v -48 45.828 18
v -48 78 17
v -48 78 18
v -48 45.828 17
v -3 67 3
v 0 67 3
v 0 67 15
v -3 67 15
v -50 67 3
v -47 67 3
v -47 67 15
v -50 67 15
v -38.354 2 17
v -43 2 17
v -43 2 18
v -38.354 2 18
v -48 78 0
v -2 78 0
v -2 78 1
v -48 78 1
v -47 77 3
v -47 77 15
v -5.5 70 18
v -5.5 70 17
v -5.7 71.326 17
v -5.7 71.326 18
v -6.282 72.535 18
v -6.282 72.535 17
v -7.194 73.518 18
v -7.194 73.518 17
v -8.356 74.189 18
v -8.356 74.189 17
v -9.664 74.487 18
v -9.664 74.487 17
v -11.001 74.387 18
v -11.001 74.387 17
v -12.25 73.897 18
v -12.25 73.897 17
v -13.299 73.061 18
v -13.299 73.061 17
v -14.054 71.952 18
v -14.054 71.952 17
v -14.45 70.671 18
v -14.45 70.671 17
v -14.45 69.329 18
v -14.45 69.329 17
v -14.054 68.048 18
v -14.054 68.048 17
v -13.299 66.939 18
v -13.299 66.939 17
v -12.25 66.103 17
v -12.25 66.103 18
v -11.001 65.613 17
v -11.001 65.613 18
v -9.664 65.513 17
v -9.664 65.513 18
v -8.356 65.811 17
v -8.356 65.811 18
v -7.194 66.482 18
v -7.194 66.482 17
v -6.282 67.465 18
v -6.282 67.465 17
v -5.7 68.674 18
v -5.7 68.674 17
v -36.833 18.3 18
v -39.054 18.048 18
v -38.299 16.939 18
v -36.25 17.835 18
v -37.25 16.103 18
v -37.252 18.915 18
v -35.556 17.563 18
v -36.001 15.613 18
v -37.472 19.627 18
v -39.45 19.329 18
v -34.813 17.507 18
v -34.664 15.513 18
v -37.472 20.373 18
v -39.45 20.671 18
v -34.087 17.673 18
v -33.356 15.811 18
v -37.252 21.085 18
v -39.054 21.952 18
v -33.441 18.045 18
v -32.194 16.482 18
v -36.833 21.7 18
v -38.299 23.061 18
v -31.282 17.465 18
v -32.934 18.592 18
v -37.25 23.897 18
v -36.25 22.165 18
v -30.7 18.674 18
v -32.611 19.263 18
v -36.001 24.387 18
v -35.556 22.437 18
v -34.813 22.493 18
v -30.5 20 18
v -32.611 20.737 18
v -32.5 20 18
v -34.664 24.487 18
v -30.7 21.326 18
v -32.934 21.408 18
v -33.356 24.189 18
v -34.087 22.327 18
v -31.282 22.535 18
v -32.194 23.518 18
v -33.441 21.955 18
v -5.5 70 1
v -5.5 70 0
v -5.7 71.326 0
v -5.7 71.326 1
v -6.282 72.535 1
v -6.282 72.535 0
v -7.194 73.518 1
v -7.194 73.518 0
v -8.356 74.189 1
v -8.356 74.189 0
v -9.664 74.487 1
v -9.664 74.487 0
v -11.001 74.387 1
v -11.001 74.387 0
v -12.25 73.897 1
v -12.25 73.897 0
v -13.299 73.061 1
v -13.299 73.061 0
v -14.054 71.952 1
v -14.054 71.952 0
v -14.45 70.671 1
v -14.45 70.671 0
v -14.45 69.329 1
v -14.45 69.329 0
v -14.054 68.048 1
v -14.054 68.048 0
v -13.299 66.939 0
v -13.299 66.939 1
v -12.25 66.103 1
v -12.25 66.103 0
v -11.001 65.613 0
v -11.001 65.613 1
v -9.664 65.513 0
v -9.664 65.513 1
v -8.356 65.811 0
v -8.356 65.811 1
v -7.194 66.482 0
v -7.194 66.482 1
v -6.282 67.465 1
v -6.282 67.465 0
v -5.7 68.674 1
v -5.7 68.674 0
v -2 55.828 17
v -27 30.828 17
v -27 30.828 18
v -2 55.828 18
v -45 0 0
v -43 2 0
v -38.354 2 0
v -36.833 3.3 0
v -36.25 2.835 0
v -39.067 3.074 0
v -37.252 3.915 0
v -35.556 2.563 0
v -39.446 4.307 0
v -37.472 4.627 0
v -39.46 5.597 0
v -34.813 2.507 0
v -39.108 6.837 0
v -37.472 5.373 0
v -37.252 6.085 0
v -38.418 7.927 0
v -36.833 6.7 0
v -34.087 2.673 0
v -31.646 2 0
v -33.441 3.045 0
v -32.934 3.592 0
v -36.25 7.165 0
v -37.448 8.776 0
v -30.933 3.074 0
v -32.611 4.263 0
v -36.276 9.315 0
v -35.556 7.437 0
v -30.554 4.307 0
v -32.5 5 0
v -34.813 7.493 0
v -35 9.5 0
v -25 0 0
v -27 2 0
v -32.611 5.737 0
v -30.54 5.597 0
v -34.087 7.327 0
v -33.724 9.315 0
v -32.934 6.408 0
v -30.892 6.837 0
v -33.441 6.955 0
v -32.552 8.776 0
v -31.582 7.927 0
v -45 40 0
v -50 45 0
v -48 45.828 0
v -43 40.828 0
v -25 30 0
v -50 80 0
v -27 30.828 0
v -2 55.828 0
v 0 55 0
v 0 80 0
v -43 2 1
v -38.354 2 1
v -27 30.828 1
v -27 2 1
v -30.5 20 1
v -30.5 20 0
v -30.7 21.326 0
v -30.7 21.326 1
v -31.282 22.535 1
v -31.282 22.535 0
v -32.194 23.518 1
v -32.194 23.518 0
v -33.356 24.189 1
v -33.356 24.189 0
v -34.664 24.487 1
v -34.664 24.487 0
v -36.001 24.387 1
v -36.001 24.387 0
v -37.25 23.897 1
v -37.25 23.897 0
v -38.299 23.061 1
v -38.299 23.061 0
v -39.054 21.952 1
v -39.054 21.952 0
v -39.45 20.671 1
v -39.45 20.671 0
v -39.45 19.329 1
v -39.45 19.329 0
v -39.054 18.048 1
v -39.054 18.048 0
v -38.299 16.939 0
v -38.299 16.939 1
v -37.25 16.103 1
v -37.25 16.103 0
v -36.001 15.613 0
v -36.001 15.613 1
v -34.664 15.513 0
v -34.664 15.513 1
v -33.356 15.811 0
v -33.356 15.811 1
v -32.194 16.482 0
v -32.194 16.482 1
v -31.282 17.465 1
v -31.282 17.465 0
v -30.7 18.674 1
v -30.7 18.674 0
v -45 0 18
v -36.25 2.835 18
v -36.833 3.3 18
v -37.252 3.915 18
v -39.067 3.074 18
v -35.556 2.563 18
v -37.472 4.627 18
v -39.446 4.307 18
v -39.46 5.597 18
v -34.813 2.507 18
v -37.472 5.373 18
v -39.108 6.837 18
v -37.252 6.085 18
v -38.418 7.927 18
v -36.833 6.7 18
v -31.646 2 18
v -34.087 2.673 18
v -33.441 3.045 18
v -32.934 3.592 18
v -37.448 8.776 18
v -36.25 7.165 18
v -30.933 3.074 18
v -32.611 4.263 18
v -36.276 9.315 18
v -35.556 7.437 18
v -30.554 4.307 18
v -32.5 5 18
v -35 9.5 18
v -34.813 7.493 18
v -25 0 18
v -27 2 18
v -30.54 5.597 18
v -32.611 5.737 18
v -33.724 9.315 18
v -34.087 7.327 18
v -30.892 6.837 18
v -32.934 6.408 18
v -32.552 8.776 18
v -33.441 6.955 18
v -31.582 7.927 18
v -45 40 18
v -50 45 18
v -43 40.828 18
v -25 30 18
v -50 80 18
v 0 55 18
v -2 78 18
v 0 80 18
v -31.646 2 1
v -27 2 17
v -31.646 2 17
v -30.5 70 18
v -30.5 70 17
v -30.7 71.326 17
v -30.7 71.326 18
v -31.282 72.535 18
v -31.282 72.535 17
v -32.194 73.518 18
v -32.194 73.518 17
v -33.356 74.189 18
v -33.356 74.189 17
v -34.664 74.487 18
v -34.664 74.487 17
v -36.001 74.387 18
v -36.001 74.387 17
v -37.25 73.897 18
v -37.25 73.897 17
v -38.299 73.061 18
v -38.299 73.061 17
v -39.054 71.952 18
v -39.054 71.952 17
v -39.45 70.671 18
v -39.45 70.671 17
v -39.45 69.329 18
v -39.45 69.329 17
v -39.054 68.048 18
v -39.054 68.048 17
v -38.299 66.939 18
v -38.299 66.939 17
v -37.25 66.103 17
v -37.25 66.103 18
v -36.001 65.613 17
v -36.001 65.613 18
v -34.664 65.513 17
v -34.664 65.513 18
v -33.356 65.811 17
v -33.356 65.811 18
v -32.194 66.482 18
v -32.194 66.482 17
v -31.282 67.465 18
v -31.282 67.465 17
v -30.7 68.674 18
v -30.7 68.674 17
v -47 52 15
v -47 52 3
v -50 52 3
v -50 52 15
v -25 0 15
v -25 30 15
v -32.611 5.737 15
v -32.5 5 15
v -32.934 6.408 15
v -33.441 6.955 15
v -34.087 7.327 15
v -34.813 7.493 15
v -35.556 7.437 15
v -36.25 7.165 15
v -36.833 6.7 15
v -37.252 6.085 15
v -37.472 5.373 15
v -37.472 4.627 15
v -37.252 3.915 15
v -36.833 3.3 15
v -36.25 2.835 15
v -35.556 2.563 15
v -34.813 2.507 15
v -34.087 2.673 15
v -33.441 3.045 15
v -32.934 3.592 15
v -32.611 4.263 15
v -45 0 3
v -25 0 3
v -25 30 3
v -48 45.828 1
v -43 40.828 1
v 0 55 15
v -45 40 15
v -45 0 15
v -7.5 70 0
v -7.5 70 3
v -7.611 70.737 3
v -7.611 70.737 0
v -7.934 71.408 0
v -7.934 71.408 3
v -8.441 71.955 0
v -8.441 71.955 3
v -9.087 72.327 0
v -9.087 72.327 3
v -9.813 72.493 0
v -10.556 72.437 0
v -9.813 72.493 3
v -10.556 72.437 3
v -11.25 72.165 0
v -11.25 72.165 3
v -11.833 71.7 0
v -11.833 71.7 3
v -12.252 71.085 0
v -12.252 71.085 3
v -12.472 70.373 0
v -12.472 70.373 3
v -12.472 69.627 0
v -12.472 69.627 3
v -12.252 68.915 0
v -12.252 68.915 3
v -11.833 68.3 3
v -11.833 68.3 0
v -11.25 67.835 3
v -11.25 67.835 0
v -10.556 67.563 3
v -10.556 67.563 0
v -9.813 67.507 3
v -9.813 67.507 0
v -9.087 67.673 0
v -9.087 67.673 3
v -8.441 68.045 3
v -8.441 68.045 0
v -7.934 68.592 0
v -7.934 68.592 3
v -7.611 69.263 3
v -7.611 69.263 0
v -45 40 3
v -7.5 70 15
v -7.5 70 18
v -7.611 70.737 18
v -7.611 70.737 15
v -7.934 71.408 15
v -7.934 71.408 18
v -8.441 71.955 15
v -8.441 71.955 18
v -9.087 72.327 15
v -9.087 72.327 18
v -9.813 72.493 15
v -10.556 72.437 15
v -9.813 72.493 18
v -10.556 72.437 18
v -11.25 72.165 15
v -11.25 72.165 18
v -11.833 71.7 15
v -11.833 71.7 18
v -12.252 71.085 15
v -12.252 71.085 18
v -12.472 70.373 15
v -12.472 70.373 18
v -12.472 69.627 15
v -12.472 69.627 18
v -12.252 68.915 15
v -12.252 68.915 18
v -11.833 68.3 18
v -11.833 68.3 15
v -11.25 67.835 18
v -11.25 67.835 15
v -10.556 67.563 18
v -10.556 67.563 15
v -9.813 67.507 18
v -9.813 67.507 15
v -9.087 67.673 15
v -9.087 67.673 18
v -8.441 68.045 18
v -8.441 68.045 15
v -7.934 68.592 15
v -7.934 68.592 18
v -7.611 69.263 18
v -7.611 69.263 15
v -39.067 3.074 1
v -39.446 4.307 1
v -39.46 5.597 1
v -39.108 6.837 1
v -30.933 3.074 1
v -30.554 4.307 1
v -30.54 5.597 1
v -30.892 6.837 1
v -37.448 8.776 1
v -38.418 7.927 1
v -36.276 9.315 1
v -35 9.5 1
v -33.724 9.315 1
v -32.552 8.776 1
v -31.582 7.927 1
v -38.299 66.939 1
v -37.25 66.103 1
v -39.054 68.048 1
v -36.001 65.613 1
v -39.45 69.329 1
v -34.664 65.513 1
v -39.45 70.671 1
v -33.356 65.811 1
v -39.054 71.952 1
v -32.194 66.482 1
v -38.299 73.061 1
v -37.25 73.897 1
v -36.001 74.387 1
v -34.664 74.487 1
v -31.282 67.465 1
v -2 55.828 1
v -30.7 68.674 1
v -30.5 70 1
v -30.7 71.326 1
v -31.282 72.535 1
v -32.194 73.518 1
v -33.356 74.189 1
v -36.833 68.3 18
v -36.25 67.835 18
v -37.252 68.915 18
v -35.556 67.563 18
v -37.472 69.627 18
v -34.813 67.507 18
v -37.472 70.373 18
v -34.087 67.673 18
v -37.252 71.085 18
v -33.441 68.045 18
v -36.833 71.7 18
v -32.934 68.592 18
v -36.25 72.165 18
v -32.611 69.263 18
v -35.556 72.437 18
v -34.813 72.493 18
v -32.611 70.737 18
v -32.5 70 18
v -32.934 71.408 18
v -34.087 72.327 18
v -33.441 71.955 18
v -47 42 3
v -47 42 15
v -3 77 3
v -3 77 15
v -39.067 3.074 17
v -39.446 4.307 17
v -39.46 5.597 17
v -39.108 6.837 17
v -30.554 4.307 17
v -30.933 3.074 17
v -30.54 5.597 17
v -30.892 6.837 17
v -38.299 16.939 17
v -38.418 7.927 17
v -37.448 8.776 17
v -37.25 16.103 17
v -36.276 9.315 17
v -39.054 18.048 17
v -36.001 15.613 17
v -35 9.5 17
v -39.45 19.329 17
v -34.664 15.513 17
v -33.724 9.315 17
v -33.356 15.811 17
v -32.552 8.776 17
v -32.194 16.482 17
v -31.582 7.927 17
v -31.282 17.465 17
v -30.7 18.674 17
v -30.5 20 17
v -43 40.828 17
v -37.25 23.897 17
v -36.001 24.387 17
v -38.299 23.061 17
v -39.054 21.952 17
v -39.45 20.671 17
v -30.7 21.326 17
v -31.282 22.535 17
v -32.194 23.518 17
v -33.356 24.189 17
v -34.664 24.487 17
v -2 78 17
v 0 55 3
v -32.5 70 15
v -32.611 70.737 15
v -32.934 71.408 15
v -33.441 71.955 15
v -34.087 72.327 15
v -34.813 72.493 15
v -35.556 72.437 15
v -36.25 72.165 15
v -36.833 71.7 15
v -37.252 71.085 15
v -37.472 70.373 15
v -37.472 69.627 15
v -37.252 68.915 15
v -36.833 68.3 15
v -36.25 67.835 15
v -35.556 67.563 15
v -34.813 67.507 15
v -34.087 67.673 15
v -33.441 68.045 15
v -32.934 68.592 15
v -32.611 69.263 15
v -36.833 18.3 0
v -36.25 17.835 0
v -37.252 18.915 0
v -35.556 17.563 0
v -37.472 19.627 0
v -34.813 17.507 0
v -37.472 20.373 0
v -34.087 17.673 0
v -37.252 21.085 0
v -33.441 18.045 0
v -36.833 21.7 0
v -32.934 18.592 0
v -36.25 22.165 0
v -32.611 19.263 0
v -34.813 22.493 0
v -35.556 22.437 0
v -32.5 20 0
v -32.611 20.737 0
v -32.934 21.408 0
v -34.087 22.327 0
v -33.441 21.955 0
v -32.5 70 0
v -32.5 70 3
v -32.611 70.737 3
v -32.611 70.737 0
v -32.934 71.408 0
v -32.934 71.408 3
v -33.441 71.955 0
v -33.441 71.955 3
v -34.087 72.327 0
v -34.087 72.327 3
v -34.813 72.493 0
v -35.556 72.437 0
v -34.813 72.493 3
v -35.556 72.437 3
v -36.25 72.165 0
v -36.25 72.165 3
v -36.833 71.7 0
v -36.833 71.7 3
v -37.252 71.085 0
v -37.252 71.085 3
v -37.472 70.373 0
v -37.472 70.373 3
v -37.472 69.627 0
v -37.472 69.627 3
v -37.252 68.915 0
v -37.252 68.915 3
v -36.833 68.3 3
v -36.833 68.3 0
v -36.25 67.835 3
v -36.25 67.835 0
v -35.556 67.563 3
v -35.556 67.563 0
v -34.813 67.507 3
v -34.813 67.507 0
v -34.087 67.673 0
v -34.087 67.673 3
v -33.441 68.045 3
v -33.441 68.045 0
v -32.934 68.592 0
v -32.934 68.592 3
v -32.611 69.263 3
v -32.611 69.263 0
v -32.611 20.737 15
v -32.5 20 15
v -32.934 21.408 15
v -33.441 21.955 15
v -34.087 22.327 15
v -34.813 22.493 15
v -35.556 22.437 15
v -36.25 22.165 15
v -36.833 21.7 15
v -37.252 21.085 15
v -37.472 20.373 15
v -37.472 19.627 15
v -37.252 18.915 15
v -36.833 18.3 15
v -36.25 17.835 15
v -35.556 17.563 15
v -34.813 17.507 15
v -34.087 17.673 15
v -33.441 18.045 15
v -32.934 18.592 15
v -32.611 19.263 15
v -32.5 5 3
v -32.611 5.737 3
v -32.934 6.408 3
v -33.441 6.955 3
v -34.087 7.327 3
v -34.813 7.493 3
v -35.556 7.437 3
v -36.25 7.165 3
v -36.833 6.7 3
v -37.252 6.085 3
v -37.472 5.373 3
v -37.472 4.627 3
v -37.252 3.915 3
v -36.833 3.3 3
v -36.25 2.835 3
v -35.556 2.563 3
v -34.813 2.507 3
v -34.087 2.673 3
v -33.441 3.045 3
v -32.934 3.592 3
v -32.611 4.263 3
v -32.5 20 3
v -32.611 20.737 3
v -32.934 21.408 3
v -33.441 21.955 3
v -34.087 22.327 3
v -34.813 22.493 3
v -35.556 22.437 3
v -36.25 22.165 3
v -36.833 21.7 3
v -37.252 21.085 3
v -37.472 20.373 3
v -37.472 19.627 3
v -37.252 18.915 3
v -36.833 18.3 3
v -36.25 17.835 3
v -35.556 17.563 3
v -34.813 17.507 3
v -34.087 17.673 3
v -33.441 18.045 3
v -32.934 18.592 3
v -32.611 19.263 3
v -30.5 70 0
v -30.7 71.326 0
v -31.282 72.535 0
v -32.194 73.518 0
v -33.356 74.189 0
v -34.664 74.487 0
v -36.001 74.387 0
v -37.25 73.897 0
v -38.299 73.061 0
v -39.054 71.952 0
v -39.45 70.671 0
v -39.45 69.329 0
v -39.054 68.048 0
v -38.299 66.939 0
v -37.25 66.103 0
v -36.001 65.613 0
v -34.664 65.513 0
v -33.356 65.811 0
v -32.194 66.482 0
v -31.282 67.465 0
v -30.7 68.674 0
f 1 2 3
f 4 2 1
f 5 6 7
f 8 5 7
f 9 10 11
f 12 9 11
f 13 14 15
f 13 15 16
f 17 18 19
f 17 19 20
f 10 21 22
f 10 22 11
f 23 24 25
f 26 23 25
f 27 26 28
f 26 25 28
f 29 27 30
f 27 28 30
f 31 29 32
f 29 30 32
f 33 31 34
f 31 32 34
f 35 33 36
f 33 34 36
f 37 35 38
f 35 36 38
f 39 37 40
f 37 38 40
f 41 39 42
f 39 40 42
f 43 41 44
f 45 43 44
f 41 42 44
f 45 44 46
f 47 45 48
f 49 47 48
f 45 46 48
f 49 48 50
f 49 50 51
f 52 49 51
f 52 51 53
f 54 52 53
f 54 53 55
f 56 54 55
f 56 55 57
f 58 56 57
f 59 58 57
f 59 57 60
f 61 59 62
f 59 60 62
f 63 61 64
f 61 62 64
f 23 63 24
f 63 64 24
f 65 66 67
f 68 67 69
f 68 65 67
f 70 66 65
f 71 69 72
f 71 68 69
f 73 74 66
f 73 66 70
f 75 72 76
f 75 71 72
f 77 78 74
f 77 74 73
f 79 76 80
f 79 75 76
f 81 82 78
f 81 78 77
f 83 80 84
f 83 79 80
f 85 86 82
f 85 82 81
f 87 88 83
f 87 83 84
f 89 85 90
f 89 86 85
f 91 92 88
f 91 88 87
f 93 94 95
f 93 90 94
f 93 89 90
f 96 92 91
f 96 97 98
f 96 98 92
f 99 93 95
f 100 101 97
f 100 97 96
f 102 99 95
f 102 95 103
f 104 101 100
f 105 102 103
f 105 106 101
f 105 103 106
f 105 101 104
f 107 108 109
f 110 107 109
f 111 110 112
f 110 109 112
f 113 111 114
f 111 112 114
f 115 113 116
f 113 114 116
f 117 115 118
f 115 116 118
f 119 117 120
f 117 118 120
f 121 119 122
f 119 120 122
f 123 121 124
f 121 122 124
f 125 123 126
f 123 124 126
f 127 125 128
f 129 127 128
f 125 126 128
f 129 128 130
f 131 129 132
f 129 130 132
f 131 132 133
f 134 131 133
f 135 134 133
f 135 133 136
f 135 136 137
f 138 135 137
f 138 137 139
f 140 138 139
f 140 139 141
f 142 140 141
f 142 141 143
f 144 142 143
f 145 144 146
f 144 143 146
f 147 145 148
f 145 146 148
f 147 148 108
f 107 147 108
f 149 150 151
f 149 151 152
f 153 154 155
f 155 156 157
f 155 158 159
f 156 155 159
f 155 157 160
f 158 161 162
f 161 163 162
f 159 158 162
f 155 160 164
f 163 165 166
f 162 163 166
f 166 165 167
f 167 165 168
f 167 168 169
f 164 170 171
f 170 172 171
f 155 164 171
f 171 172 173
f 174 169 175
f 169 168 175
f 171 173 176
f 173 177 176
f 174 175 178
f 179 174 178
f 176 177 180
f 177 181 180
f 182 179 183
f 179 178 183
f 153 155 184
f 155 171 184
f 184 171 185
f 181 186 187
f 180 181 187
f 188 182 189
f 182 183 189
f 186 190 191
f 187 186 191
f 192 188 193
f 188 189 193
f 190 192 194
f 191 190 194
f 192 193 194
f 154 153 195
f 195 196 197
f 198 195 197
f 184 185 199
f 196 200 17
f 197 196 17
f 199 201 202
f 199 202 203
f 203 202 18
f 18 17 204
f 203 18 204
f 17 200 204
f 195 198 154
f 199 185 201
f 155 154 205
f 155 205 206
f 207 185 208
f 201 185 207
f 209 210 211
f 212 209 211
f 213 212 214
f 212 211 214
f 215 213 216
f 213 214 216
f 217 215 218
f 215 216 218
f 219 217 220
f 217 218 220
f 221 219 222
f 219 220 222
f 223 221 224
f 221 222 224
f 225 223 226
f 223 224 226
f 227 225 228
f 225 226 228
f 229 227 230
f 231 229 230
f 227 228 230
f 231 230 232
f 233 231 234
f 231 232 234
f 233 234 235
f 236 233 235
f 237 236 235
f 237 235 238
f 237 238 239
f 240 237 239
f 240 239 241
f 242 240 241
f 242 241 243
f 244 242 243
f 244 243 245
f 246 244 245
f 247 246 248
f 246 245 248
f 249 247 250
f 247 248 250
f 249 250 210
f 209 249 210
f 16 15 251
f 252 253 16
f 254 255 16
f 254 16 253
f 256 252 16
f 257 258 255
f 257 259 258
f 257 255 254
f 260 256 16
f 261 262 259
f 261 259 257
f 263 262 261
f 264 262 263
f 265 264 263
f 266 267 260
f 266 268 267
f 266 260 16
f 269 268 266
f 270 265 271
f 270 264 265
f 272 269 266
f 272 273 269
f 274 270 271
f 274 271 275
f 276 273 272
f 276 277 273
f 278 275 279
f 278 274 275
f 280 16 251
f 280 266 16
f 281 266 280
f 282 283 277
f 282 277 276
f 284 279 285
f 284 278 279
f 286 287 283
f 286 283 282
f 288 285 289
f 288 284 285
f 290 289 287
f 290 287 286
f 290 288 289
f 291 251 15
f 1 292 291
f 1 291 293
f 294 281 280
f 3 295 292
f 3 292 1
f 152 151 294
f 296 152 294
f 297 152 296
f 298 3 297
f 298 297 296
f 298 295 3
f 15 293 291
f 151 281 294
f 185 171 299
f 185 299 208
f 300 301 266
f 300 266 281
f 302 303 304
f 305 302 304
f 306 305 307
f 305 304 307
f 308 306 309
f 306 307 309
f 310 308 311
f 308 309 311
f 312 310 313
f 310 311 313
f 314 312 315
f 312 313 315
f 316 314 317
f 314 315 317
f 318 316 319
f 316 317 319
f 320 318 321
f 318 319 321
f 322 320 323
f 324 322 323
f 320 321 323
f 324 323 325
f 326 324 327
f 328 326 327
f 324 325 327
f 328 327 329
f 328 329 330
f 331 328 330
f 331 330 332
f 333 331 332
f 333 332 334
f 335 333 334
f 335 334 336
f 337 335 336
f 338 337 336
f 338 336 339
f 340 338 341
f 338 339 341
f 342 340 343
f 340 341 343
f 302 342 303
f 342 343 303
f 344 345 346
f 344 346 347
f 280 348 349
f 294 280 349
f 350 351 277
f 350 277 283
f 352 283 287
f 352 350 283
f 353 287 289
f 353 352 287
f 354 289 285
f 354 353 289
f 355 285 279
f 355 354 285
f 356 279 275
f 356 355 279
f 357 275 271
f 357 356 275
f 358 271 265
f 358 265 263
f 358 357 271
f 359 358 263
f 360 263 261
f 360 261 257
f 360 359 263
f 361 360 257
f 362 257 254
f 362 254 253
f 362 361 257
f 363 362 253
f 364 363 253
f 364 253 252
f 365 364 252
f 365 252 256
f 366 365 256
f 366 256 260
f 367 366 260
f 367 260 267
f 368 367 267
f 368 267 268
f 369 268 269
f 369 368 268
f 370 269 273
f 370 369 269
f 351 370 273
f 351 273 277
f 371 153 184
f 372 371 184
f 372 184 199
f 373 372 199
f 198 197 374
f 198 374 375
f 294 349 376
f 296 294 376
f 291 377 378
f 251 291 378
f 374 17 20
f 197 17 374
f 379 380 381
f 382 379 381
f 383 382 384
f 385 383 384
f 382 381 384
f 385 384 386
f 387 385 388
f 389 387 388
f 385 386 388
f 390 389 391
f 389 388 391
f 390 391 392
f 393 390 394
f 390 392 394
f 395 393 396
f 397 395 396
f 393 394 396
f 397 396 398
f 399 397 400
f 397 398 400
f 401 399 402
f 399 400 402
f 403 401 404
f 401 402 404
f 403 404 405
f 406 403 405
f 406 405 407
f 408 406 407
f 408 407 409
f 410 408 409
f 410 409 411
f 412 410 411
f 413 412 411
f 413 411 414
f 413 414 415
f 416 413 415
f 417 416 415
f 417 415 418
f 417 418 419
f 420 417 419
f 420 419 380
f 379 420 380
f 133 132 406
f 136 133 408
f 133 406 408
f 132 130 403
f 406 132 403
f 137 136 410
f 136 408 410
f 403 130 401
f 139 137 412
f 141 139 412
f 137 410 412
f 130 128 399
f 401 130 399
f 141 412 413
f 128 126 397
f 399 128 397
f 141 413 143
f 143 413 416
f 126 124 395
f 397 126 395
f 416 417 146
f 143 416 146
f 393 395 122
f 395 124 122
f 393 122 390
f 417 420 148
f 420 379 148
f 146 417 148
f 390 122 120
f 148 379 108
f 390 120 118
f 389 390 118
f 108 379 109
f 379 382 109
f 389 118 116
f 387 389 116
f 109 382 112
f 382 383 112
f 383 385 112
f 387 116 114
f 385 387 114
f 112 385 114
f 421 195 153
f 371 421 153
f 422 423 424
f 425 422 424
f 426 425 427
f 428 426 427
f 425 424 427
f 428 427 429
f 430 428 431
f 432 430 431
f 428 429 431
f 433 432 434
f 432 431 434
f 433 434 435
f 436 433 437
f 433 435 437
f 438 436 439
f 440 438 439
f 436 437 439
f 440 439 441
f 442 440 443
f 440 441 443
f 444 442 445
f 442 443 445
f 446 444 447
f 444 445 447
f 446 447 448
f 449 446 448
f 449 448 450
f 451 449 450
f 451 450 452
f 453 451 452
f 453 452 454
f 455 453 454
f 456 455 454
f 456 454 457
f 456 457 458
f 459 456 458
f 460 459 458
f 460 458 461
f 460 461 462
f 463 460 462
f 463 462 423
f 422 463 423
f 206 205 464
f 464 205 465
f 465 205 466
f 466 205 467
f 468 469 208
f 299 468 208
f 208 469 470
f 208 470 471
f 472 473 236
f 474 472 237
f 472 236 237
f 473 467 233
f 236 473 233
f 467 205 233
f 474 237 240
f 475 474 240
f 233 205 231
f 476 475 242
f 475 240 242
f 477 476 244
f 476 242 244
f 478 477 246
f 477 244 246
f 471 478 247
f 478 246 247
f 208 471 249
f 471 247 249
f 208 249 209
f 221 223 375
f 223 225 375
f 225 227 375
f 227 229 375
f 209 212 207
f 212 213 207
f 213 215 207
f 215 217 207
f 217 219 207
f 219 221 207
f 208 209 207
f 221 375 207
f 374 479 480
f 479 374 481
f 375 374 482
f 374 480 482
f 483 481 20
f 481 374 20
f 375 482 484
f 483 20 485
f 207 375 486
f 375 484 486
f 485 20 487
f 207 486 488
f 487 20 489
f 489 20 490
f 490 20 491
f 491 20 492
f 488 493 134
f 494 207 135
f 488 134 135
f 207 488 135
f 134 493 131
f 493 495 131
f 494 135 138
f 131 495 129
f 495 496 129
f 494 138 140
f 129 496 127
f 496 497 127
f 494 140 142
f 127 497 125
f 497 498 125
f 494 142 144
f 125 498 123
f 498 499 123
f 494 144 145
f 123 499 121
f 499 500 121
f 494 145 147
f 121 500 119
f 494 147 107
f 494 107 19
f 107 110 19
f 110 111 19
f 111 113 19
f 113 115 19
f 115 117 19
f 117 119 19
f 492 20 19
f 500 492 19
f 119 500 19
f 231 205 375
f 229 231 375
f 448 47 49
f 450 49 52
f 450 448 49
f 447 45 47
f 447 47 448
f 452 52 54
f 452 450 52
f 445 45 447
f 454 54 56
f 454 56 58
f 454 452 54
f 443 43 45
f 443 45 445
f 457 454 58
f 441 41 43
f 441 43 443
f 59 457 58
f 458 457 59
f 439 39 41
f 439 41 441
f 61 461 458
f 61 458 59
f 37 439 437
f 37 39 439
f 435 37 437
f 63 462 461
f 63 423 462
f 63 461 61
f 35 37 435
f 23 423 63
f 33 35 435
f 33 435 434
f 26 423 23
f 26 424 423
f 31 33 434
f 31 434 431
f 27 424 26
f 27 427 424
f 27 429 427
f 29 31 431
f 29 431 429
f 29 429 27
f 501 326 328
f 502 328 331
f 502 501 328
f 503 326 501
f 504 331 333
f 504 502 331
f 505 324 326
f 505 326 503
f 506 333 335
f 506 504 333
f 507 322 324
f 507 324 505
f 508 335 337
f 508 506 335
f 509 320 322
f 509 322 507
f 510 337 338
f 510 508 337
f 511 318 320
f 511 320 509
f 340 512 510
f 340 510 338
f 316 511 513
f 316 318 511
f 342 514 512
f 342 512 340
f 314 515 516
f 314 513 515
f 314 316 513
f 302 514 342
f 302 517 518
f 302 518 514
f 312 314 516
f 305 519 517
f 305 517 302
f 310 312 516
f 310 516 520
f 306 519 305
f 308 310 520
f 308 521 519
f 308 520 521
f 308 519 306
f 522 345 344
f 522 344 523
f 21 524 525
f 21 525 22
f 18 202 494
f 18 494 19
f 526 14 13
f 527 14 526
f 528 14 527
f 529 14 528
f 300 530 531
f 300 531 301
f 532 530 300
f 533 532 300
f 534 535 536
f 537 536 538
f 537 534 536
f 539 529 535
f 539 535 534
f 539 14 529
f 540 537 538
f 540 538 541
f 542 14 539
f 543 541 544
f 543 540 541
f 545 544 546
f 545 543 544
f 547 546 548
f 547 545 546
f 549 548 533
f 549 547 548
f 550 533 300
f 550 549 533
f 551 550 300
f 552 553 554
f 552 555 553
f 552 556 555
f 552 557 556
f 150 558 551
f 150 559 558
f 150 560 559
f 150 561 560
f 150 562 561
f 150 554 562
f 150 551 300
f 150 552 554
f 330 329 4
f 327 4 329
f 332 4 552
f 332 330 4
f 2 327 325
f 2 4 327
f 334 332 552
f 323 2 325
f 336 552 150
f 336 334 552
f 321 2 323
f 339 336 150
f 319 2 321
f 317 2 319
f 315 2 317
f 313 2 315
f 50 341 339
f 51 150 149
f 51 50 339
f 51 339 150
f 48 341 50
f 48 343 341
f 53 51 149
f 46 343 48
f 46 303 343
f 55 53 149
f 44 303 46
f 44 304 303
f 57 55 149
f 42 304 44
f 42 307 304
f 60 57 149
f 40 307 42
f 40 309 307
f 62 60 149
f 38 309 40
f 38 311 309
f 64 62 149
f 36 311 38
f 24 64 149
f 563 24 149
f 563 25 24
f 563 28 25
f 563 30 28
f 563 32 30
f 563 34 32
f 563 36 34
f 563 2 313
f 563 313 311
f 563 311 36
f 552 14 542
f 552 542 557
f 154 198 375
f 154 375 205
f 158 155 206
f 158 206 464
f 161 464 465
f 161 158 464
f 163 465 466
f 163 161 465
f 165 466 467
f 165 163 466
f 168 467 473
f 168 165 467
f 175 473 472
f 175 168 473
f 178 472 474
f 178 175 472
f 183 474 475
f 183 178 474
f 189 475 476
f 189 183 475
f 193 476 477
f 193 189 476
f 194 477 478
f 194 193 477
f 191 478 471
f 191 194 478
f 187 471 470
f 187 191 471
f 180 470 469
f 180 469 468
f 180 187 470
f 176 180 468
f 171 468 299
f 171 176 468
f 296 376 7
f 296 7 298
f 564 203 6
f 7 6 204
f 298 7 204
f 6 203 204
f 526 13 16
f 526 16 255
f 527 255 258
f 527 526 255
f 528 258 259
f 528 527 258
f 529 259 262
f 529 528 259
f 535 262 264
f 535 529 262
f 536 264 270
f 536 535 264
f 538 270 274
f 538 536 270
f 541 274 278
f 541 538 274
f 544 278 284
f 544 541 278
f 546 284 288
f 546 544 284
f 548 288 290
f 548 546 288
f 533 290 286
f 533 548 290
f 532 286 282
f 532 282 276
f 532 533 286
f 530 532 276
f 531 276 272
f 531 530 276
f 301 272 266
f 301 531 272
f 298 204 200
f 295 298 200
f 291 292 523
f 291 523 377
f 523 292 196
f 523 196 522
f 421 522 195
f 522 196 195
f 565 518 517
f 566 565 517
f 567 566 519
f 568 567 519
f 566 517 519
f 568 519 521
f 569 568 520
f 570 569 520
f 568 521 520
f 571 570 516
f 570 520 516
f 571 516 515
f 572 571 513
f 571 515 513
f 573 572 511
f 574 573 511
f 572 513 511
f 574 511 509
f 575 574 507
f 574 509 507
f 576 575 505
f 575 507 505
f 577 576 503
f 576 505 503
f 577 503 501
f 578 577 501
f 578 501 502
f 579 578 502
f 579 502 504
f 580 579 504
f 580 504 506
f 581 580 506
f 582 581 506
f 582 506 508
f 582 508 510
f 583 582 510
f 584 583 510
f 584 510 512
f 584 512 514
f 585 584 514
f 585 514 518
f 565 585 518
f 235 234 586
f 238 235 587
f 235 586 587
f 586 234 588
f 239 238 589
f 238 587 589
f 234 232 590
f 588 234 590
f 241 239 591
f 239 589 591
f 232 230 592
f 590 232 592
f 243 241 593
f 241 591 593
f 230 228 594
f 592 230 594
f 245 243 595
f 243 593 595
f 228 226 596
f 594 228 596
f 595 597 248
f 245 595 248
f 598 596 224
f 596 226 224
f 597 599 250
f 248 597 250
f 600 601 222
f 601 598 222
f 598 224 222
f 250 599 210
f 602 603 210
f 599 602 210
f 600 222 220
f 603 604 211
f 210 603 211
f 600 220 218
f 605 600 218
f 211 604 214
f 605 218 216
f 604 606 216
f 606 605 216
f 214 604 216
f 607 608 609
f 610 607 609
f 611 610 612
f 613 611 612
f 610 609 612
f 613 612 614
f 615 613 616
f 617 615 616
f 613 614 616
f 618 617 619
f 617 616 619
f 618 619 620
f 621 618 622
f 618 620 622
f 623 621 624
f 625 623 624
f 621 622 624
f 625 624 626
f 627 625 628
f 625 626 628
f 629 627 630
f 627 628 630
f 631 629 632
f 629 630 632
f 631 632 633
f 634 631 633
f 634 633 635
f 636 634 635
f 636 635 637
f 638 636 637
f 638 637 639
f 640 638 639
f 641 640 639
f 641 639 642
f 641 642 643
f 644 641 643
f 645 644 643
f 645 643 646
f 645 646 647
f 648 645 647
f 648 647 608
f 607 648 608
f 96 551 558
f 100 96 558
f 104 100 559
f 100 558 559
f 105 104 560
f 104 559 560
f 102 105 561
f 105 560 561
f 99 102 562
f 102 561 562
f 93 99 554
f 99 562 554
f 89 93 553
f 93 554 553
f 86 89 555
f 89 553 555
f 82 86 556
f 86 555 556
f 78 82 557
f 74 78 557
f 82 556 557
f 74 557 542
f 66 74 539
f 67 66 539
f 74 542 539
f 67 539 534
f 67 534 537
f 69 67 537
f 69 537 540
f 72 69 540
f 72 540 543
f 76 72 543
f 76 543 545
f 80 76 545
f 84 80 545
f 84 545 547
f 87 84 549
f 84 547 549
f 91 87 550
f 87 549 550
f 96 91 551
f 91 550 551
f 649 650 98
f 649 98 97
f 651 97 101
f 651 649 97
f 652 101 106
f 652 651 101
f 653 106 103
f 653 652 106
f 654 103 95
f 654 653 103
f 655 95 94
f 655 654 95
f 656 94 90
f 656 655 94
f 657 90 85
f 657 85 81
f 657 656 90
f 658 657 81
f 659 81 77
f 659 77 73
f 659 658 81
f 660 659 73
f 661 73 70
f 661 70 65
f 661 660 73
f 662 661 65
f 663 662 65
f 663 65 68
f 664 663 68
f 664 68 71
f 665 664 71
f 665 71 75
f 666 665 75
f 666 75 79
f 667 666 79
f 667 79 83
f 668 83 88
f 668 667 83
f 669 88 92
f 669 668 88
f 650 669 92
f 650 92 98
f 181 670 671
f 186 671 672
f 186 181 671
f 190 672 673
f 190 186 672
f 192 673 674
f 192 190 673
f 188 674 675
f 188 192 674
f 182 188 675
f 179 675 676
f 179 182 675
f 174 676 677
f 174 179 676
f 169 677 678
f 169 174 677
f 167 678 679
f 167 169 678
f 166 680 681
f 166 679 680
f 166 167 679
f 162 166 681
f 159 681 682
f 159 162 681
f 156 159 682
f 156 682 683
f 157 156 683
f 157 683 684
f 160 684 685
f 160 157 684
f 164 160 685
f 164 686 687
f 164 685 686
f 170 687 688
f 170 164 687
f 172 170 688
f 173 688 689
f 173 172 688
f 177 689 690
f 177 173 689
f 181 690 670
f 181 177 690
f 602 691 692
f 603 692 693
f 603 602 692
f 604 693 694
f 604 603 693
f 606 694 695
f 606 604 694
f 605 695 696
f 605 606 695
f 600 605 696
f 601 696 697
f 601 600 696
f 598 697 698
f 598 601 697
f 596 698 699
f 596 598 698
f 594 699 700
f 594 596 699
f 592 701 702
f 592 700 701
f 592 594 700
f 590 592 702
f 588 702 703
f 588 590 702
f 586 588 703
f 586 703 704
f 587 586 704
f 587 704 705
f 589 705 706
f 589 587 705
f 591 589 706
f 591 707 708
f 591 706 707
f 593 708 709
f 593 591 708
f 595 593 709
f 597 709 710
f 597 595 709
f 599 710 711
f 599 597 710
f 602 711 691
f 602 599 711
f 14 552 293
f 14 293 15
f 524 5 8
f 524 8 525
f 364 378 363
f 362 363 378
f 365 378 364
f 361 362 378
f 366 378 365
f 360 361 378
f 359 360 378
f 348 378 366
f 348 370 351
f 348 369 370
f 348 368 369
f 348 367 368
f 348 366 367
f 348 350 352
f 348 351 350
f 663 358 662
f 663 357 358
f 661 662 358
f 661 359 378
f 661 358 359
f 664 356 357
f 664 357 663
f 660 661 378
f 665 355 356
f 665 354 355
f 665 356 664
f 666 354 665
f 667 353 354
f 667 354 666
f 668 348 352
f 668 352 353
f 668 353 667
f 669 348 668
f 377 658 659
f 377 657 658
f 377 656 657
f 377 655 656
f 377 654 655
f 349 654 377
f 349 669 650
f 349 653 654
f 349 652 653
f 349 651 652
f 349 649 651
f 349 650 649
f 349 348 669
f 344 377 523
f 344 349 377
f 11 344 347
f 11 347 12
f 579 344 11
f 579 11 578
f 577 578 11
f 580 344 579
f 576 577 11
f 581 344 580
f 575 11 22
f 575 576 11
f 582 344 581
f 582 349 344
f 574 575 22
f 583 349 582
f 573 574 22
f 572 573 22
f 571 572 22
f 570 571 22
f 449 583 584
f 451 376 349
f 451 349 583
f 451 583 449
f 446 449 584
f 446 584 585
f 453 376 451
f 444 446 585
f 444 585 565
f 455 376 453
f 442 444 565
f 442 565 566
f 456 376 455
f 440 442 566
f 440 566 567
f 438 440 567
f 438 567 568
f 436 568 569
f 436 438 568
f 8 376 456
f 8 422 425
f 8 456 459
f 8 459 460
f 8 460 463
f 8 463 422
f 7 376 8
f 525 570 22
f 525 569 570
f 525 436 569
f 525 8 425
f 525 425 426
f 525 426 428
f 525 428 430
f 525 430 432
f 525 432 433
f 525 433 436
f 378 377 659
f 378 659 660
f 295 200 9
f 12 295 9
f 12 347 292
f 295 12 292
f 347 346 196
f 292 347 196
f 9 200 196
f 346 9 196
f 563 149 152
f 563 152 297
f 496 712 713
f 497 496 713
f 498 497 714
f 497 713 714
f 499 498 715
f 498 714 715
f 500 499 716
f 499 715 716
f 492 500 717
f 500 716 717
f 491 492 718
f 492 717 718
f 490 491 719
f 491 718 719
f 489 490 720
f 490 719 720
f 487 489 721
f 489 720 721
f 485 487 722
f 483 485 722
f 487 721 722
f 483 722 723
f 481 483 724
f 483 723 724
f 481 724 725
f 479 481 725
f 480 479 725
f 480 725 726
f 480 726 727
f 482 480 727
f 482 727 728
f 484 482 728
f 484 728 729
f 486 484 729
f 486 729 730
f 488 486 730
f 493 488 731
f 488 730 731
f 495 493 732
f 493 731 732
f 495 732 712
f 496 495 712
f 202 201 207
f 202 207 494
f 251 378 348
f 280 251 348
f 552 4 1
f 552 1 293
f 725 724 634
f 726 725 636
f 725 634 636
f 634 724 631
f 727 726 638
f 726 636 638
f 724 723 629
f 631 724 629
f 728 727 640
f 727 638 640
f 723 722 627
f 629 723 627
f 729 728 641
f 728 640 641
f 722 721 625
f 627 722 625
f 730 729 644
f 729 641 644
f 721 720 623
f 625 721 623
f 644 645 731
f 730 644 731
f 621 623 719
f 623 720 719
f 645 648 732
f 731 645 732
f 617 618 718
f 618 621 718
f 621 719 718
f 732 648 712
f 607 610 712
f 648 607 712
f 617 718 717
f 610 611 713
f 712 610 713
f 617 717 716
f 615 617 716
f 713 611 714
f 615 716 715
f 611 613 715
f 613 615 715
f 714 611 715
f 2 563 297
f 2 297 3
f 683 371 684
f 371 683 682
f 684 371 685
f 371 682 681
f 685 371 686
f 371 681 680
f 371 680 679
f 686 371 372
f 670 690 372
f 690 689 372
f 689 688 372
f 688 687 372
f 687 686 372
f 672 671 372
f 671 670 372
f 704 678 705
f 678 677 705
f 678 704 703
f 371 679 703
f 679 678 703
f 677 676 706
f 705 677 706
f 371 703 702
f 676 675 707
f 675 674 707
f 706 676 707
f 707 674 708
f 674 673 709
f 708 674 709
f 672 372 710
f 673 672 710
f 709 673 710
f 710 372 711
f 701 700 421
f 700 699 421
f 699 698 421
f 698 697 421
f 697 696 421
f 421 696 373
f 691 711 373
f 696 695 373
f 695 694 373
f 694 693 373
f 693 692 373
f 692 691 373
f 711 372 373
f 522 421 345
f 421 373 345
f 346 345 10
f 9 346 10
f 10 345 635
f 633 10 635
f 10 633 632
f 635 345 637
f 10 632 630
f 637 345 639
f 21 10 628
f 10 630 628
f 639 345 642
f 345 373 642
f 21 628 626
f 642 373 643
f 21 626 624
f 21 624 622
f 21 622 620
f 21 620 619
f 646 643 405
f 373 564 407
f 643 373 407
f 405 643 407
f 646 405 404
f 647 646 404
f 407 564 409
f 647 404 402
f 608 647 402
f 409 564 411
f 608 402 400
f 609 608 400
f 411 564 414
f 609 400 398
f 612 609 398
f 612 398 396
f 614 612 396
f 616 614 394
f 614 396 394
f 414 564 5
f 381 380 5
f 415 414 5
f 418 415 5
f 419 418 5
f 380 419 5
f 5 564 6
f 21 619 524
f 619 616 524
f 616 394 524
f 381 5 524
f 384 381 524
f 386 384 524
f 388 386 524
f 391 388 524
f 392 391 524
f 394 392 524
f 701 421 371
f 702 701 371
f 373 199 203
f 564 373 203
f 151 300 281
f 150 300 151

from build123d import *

# Parameters (mm, degrees)
ESQUISSE1_R                  = 2.5
BOSS_EXTRU_1_DEPTH           = 18
COQUE2_T                     = -3
ENL_V_MAT_EXTRU_1_DEPTH      = 94.536089292
ENL_V_MAT_EXTRU_1_DEPTH_BACK = 94.536089292
ESQUISSE2_W                  = 12
ESQUISSE2_H                  = 15
ESQUISSE3_R                  = 2.5
ENL_V_MAT_EXTRU_3_DEPTH      = 97.041657628
SHELL2_OUTLINE_R             = 4.5
SHELL2_DEPTH                 = 1
SHELL2_START                 = 17
SHELL2_2_OUTLINE_R           = 4.5
SHELL2_2_DEPTH               = 1


# Read off the part's stored shape, not the designer's step: Shell2
with BuildPart() as part:
    # Esquisse1 → Boss.-Extru.1 (new body)
    with BuildSketch(Plane.XY):
        Polygon((-50, 45), (-45, 40), (-45, 0), (-25, 0), (-25, 30), (0, 55), (0, 80), (-50, 80), align=None)
        with Locations((-35, 5)):
            Circle(ESQUISSE1_R, mode=Mode.SUBTRACT)
        with Locations((-35, 20)):
            Circle(ESQUISSE1_R, mode=Mode.SUBTRACT)
    extrude(amount=BOSS_EXTRU_1_DEPTH)

    # Coque2
    coque2_openings = [part.faces().sort_by_distance(p)[0] for p in [
        (-35, 0, 9),
        (-45, 20, 9),
        (-47.5, 42.5, 9),
        (-12.5, 42.5, 9),
        (-25, 15, 9),
        (-37.5, 5, 9),
        (-37.5, 20, 9),
    ]]
    offset(amount=COQUE2_T, openings=coque2_openings, kind=Kind.INTERSECTION)

    # Esquisse2 → Enlèv. mat.-Extru.1 (cut, two sides: drawn at the far end of the back side and taken through both)
    with BuildSketch(Plane.ZY.offset(45).offset(-ENL_V_MAT_EXTRU_1_DEPTH_BACK)):
        with Locations((9, 59.5)):
            Rectangle(ESQUISSE2_W, ESQUISSE2_H)
    extrude(amount=ENL_V_MAT_EXTRU_1_DEPTH + ENL_V_MAT_EXTRU_1_DEPTH_BACK, mode=Mode.SUBTRACT)

    # Esquisse3 → Enlèv. mat.-Extru.3 (cut, through all)
    with BuildSketch(Plane.XY.offset(18)):
        with Locations((-35, 70)):
            Circle(ESQUISSE3_R)
        with Locations((-10, 70)):
            Circle(ESQUISSE3_R)
    extrude(amount=-ENL_V_MAT_EXTRU_3_DEPTH, mode=Mode.SUBTRACT)

    # Shell2 outline → Shell2 (cut)
    with BuildSketch(Plane.XY):
        with BuildLine():
            Line((-43, 2), (-38.354101966, 2))
            ThreePointArc((-38.354101966, 2), (-35, 9.5), (-31.645898034, 2))
            Line((-31.645898034, 2), (-27, 2))
            Line((-27, 2), (-27, 30.828427125))
            Line((-27, 30.828427125), (-2, 55.828427125))
            Line((-2, 55.828427125), (-2, 78))
            Line((-2, 78), (-48, 78))
            Line((-48, 78), (-48, 45.828427125))
            Line((-48, 45.828427125), (-43, 40.828427125))
            Line((-43, 40.828427125), (-43, 2))
        make_face()
        with Locations((-35, 20)):
            Circle(SHELL2_OUTLINE_R, mode=Mode.SUBTRACT)
        with Locations((-35, 70)):
            Circle(SHELL2_OUTLINE_R, mode=Mode.SUBTRACT)
        with Locations((-10, 70)):
            Circle(SHELL2_OUTLINE_R, mode=Mode.SUBTRACT)
    extrude(amount=SHELL2_DEPTH, mode=Mode.SUBTRACT)

    # Shell2 2 outline → Shell2 2 (cut)
    with BuildSketch(Plane.XY.offset(SHELL2_START)):
        with BuildLine():
            Line((-43, 2), (-38.354101966, 2))
            ThreePointArc((-38.354101966, 2), (-35, 9.5), (-31.645898034, 2))
            Line((-31.645898034, 2), (-27, 2))
            Line((-27, 2), (-27, 30.828427125))
            Line((-27, 30.828427125), (-2, 55.828427125))
            Line((-2, 55.828427125), (-2, 78))
            Line((-2, 78), (-48, 78))
            Line((-48, 78), (-48, 45.828427125))
            Line((-48, 45.828427125), (-43, 40.828427125))
            Line((-43, 40.828427125), (-43, 2))
        make_face()
        with Locations((-35, 20)):
            Circle(SHELL2_2_OUTLINE_R, mode=Mode.SUBTRACT)
        with Locations((-35, 70)):
            Circle(SHELL2_2_OUTLINE_R, mode=Mode.SUBTRACT)
        with Locations((-10, 70)):
            Circle(SHELL2_2_OUTLINE_R, mode=Mode.SUBTRACT)
    extrude(amount=SHELL2_2_DEPTH, mode=Mode.SUBTRACT)


solid = part.part
